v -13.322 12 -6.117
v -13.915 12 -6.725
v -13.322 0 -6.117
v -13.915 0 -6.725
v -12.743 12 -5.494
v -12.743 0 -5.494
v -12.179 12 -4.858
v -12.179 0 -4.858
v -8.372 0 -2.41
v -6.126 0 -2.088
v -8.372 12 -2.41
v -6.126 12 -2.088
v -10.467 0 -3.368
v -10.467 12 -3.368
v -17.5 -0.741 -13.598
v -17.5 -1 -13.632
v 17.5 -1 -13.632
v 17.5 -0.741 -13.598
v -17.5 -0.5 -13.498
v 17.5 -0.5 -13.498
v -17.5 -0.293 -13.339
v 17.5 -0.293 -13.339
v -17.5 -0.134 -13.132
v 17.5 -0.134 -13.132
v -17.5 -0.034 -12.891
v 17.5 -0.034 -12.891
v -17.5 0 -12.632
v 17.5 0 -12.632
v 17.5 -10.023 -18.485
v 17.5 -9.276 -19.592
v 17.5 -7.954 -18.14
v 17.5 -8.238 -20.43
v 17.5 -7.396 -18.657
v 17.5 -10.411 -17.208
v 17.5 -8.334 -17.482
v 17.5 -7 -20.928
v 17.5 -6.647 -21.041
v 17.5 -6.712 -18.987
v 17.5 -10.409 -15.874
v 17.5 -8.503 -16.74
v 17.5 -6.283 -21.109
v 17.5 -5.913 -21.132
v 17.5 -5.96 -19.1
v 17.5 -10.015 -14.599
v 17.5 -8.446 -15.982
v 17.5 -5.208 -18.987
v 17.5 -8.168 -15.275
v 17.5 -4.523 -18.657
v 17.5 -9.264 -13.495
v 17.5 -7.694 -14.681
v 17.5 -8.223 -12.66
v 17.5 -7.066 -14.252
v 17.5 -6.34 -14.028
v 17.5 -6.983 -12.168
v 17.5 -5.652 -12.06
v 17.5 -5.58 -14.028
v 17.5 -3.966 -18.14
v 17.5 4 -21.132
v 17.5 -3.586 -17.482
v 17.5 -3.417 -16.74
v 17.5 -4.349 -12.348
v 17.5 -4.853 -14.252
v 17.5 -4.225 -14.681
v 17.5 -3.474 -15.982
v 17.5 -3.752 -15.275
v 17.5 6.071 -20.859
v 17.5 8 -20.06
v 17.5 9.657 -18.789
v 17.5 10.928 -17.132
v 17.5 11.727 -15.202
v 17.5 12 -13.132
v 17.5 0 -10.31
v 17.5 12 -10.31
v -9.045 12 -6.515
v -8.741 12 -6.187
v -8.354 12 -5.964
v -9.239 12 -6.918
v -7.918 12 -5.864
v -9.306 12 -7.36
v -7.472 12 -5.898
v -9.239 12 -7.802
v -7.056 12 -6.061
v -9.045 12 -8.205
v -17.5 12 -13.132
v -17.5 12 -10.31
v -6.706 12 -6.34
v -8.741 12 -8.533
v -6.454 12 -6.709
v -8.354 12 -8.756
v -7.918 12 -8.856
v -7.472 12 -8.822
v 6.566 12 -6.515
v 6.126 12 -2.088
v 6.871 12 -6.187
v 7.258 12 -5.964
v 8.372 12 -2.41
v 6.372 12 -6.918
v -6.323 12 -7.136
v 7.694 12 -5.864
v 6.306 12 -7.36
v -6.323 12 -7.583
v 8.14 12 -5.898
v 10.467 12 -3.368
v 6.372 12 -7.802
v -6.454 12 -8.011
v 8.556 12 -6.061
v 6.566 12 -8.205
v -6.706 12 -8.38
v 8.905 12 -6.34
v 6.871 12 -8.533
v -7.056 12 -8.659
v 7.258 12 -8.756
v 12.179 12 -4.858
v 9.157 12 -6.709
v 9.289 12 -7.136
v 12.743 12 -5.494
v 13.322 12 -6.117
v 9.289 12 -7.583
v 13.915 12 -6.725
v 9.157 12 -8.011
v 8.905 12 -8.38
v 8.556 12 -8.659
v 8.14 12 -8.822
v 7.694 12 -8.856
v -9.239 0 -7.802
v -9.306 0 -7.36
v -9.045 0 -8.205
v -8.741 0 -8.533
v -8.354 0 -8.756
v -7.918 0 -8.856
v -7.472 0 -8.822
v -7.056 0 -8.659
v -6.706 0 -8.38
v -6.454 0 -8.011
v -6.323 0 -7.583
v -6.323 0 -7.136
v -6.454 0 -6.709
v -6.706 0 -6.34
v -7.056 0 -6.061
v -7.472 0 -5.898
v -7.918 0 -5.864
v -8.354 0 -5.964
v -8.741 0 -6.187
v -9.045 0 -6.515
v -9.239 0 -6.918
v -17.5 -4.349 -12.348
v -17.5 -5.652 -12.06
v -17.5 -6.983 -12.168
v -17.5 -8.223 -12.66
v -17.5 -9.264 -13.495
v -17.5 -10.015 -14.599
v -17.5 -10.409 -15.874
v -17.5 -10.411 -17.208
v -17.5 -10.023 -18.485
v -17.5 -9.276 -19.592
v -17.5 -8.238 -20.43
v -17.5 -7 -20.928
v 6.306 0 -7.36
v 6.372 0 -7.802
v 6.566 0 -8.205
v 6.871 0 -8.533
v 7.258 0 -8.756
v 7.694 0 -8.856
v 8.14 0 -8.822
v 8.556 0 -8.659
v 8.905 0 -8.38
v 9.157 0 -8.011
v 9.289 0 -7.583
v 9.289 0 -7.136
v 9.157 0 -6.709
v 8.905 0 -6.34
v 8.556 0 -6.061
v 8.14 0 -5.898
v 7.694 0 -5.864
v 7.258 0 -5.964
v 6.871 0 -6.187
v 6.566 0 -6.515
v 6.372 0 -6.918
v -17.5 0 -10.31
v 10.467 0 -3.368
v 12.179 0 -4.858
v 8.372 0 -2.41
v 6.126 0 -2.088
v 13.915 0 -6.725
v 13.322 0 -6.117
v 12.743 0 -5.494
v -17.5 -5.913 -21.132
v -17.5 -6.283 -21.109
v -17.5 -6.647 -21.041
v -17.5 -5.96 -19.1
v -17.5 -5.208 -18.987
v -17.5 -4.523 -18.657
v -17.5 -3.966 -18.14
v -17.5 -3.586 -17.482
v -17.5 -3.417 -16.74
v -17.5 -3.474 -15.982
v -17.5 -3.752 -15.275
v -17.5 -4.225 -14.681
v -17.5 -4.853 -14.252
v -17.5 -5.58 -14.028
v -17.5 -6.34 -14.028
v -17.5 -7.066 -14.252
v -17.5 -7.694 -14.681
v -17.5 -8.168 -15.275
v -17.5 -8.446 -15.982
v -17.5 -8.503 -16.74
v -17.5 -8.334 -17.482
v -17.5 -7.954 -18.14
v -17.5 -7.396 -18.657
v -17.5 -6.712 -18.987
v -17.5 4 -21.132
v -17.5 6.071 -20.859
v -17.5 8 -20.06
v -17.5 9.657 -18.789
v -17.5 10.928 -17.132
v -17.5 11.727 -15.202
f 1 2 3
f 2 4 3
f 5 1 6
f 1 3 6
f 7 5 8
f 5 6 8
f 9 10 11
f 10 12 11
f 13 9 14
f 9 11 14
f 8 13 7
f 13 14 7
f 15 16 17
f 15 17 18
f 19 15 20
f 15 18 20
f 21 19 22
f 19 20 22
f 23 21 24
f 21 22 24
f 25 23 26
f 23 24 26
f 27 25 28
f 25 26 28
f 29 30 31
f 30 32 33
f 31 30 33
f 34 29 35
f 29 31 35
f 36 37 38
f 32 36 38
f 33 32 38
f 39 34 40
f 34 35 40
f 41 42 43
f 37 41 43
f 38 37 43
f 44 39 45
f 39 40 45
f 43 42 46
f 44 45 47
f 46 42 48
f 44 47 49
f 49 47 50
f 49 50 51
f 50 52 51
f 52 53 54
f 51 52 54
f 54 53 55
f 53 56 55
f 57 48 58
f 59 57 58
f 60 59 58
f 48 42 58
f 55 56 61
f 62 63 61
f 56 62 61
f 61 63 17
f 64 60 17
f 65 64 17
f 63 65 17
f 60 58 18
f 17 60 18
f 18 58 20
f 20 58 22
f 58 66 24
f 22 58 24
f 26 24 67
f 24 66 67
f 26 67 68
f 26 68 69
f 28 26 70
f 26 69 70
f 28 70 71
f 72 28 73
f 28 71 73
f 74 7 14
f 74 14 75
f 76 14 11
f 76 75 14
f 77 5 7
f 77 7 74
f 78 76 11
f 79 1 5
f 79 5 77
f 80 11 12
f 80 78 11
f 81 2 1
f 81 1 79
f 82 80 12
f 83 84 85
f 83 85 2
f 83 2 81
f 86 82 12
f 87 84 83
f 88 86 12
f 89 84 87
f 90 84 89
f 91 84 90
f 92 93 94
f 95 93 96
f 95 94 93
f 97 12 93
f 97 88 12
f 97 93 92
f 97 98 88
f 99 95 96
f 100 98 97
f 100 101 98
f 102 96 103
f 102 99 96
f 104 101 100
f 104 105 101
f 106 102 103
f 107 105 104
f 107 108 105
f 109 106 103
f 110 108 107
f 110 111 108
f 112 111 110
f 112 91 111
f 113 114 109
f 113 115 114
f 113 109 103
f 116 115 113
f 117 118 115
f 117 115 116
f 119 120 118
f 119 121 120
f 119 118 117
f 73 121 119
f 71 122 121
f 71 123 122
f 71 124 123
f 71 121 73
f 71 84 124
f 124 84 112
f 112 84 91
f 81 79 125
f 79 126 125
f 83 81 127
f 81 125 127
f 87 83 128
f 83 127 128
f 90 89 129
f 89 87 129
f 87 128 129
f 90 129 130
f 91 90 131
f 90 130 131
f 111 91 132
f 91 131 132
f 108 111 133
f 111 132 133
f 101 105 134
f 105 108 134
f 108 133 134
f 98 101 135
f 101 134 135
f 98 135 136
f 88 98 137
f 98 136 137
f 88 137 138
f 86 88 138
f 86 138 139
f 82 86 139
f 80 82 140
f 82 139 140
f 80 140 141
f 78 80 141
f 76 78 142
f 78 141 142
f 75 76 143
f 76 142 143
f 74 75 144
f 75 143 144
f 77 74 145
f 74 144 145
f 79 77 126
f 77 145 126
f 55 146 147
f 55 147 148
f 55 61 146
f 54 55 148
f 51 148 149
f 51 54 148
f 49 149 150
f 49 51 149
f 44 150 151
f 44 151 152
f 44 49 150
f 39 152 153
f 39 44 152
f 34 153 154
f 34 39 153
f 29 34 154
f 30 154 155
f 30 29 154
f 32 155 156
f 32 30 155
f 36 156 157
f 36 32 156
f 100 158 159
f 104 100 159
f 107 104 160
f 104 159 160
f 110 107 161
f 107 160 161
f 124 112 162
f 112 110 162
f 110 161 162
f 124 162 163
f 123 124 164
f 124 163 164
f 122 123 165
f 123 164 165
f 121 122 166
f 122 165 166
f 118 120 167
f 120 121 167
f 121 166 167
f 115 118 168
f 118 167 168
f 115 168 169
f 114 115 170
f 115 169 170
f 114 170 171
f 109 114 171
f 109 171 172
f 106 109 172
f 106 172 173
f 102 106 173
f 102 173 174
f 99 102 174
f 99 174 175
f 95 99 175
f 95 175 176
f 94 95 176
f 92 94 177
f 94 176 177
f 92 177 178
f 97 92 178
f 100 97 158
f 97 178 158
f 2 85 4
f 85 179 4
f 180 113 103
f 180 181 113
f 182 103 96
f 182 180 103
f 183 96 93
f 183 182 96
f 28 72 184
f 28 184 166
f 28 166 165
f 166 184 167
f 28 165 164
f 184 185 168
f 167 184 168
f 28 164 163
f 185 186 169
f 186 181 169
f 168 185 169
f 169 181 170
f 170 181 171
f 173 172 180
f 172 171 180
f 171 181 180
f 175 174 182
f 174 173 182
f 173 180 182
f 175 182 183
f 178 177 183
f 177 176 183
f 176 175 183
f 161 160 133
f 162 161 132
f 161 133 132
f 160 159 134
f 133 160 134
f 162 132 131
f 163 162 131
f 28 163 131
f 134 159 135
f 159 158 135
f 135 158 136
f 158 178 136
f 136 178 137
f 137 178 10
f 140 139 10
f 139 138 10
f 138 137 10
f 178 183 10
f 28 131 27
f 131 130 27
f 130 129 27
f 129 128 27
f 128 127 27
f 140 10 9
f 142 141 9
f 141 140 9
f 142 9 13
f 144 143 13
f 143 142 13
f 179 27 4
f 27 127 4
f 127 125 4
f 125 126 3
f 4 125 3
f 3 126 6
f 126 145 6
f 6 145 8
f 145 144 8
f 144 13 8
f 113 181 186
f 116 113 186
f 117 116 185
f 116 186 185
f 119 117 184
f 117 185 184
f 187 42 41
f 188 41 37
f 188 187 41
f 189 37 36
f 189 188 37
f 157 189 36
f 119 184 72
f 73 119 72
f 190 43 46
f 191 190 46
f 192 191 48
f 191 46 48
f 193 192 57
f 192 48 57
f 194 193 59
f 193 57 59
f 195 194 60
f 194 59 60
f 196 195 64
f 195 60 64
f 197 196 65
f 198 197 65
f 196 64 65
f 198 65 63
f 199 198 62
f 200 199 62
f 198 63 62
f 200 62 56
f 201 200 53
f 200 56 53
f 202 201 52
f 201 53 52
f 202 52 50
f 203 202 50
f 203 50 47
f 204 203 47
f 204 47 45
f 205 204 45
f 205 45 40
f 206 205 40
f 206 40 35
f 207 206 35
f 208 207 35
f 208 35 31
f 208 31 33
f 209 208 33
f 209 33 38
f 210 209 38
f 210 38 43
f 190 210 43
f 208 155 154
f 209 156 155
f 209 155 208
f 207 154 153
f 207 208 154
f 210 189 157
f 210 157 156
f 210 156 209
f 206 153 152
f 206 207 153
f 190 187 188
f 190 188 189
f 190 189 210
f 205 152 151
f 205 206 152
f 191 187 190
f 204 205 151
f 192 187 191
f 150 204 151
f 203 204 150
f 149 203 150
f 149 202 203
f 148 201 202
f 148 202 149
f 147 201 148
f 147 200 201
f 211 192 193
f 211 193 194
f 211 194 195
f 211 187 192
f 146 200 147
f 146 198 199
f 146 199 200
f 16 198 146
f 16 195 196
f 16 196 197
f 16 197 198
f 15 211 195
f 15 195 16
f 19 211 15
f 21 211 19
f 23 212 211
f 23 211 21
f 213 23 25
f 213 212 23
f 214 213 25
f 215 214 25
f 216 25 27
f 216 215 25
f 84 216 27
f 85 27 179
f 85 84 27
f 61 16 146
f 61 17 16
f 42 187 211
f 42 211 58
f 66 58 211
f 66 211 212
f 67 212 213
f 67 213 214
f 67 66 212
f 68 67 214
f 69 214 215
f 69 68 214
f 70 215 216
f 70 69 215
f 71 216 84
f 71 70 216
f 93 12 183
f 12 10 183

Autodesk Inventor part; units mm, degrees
ref_plane "YZ Plane" through (0, 0, 0) normal (1, 0, 0) x (0, 1, 0)
ref_plane "XZ Plane" through (0, 0, 0) normal (0, 1, 0) x (-1, 0, 0)
ref_plane "XY Plane" through (0, 0, 0) normal (0, 0, 1) x (1, 0, 0)
sketch "Sketch1" plane through (0, 0, 0) normal (0, 1, 0) x (-1, 0, 0)
  circle A0 centre (-30, -5.1319) radius 1.5
  arc A1 (-31.1155, 2.2846) -> (-30, -12.6319) centre (-30, -5.1319) ccw
  arc A2 (-30, -12.6319) -> (-31.1155, 2.2846) centre (-30, -5.1319) ccw construction
  circle A3 centre (-16.9706, -0.5878) radius 1.5
  circle A4 centre (16.9706, -0.5878) radius 1.5
  circle A5 centre (16.9706, -0.5878) radius 5 construction
  line L0 (-16.9706, 4.4122) -> (-31.1155, 2.2846)
  circle A6 centre (-16.9706, -0.5878) radius 5 construction
  circle A7 centre (-7.8058, -8.4213) radius 1.55
  line L1 (0, -8.4213) -> (-15.6117, -8.4213) construction
  circle A8 centre (0, 0) radius 1.55
  line L2 (-16.9706, 4.4122) -> (16.9706, 4.4122)
  line L3 (30, -12.6319) -> (-30, -12.6319)
  circle A9 centre (30, -5.1319) radius 1.5
  line L4 (0, 4.2106) -> (0, -4.2106) construction
  line L5 (0, -4.2106) -> (0, -12.6319) construction
  line L6 (0, -4.2106) -> (3.1574, -4.2106) construction
  line L7 (0, -8.4213) -> (15.6117, -8.4213) construction
  line L8 (16.9706, 4.4122) -> (31.1155, 2.2846)
  arc A10 (31.1155, 2.2846) -> (30, -12.6319) centre (30, -5.1319) ccw construction
  arc A11 (30, -12.6319) -> (31.1155, 2.2846) centre (30, -5.1319) ccw
  circle A12 centre (7.8058, -8.4213) radius 1.55
  point P0 (0, 0)
  point P1 (0, 0)
  dimension "d0" = 10
  dimension "d1" = 10
  dimension "d2" = 15
  dimension "d3" = 15
  dimension "d4" = 3.1
  dimension "d5" = 3.1
  dimension "d6" = 3.1
sketch "Sketch2" plane through (0, 0, 0) normal (0, 1, 0) x (-1, 0, 0)
  circle A0 centre (15, 9.8681) radius 3
  circle A1 centre (16.9706, -0.5878) radius 1.5
  arc A2 (3.1574, 6.6664) -> (-3.1574, 6.6664) centre (0, 4.2106) ccw
  line L0 (3.1574, 6.6664) -> (11.0366, -3.464)
  arc A3 (11.0366, -3.464) -> (13.9152, -6.7248) centre (38.6639, 18.024) ccw
  line L1 (13.9152, -6.7248) -> (21.1612, -13.9708)
  arc A4 (30.0072, 37.5736) -> (30.286, 34.6489) centre (32.7505, 36.3595) ccw
  arc A5 (35.8309, 43.8114) -> (30.0072, 37.5736) centre (41.895, 32.3124) ccw
  circle A6 centre (25.4558, 41.8386) radius 1.5
  circle A7 centre (30, 54.8681) radius 1.5
  circle A8 centre (16.9706, 50.3239) radius 1.5
  circle A9 centre (15, 39.8681) radius 3
  circle A10 centre (24.2029, 72.4055) radius 1.5
  line L2 (27.7949, 74.3102) -> (17.0958, 107.9924)
  arc A11 (17.0958, 107.9924) -> (14.6505, 110.5406) centre (13.2835, 106.7814) ccw
  circle A12 centre (13.2835, 106.7814) radius 1.5
  line L3 (14.6505, 110.5406) -> (2.0505, 115.1224)
  circle A13 centre (-24.2029, 72.4055) radius 1.5
  arc A14 (2.0505, 115.1224) -> (-2.0505, 115.1224) centre (0, 109.4837) ccw
  line L4 (-17.0958, 107.9924) -> (-27.7949, 74.3102)
  circle A15 centre (-13.2835, 106.7814) radius 1.5
  arc A16 (-14.6505, 110.5406) -> (-17.0958, 107.9924) centre (-13.2835, 106.7814) ccw
  line L5 (-2.0505, 115.1224) -> (-14.6505, 110.5406)
  line L6 (-25.5, 17.3681) -> (-25.5, 32.3681)
  line L7 (-28.5, 32.3681) -> (-28.5, 17.3681)
  line L8 (-31, 32.3681) -> (-31, 17.3681)
  arc A17 (-28.5, 17.3681) -> (-25.5, 17.3681) centre (-27, 17.3681) ccw
  arc A18 (-31, 17.3681) -> (-30.286, 15.0873) centre (-27, 17.3681) ccw
  arc A19 (-30.0072, 37.5736) -> (-35.8309, 43.8114) centre (-41.895, 32.3124) ccw
  arc A20 (-25.5, 32.3681) -> (-28.5, 32.3681) centre (-27, 32.3681) ccw
  arc A21 (-30.286, 34.6489) -> (-31, 32.3681) centre (-27, 32.3681) ccw
  arc A22 (-30.286, 34.6489) -> (-30.0072, 37.5736) centre (-32.7505, 36.3595) ccw
  circle A23 centre (-25.4558, 41.8386) radius 1.5
  circle A24 centre (-15, 39.8681) radius 3
  circle A25 centre (-16.9706, 50.3239) radius 1.5
  arc A26 (-30.0072, 12.1625) -> (-30.286, 15.0873) centre (-32.7505, 13.3766) ccw
  arc A27 (-35.8309, 5.9248) -> (-30.0072, 12.1625) centre (-41.895, 17.4238) ccw
  arc A28 (-35.8309, 5.9248) -> (-21.1612, -13.9708) centre (-30, -5.1319) ccw
  line L9 (-21.1612, -13.9708) -> (-13.9152, -6.7248)
  circle A29 centre (-15, 9.8681) radius 3
  circle A30 centre (-25.4558, 7.8975) radius 1.5
  circle A31 centre (-16.9706, -0.5878) radius 1.5
  circle A32 centre (-30, -5.1319) radius 1.5
  line L10 (-11.0366, -3.464) -> (-3.1574, 6.6664)
  arc A33 (-13.9152, -6.7248) -> (-11.0366, -3.464) centre (-38.6639, 18.024) ccw
  line L11 (31, 17.3681) -> (31, 32.3681)
  arc A34 (28.5, 32.3681) -> (25.5, 32.3681) centre (27, 32.3681) ccw
  line L12 (25.5, 32.3681) -> (25.5, 17.3681)
  line L13 (28.5, 17.3681) -> (28.5, 32.3681)
  arc A35 (31, 32.3681) -> (30.286, 34.6489) centre (27, 32.3681) ccw
  arc A36 (-34.9925, 66.3278) -> (-27.7949, 74.3102) centre (-40.1848, 78.2458) ccw
  arc A37 (-34.9925, 66.3278) -> (-35.8309, 43.8114) centre (-30, 54.8681) ccw
  circle A38 centre (-30, 54.8681) radius 1.5
  arc A39 (30.0072, 12.1625) -> (35.8309, 5.9248) centre (41.895, 17.4238) ccw
  circle A40 centre (30, -5.1319) radius 1.5
  arc A41 (21.1612, -13.9708) -> (35.8309, 5.9248) centre (30, -5.1319) ccw
  circle A42 centre (25.4558, 7.8975) radius 1.5
  arc A43 (25.5, 17.3681) -> (28.5, 17.3681) centre (27, 17.3681) ccw
  arc A44 (30.286, 15.0873) -> (30.0072, 12.1625) centre (32.7505, 13.3766) ccw
  arc A45 (30.286, 15.0873) -> (31, 17.3681) centre (27, 17.3681) ccw
  arc A46 (35.8309, 43.8114) -> (34.9925, 66.3278) centre (30, 54.8681) ccw
  arc A47 (27.7949, 74.3102) -> (34.9925, 66.3278) centre (40.1848, 78.2458) ccw
  circle A48 centre (-30, -5.1319) radius 1.5 construction
  point P0 (0, 0)
  point P1 (0, 109.4837)
sketch "Sketch3" plane through (0, 0, 0) normal (0, 1, 0) x (-1, 0, 0)
  arc A0 (3.1574, 6.6664) -> (-3.1574, 6.6664) centre (0, 4.2106) ccw projected
  line L0 (-11.0366, -3.464) -> (-3.1574, 6.6664) projected
  line L1 (3.1574, 6.6664) -> (11.0366, -3.464) projected
  arc A1 (11.0366, -3.464) -> (13.9152, -6.7248) centre (38.6639, 18.024) ccw projected
  arc A2 (-13.9152, -6.7248) -> (-11.0366, -3.464) centre (-38.6639, 18.024) ccw projected
  line L2 (-21.1612, -13.9708) -> (-13.9152, -6.7248) projected
  line L3 (13.9152, -6.7248) -> (21.1612, -13.9708) projected
  line L4 (30, -12.6319) -> (-30, -12.6319) projected
  circle A3 centre (-7.8058, -8.4213) radius 1.55 construction
  circle A4 centre (7.8058, -8.4213) radius 1.55 construction
  circle A5 centre (0, 0) radius 1.55 projected
  circle A6 centre (-16.9706, -0.5878) radius 1.5 construction
  circle A7 centre (16.9706, -0.5878) radius 1.5 construction
  line L5 (-16.9706, -2.0878) -> (16.9706, -2.0878) construction
  line L6 (7.8058, -12.6319) -> (7.8058, -2.0878) construction
  line L7 (-7.8058, -12.6319) -> (-7.8058, -2.0878) construction
  circle A8 centre (-7.8058, -7.3599) radius 1.5
  circle A9 centre (7.8058, -7.3599) radius 1.5
  line L8 (-5.032, -12.6319) -> (-5.032, -2.0878) construction
  line L9 (-5.032, -7.3599) -> (-10.6888, -7.3599) construction
  point P0 (0, 0)
  point P1 (-19.8223, -12.6319)
  point P2 (19.8223, -12.6319)
  dimension "d38" = 3
  dimension "d39" = 3
  dimension "d42" = 10.5442
extrude "Extrusion1" add sketch "Sketch3" along normal blind 6 contours L1 A1 L3 L4 L2 A2 L0 A0 | A8 | A9
sketch "Sketch4" plane through (19.8223, 0, -12.6319) normal (0, 0, -1) x (-1, 0, 0)
  line L0 (0, 0) -> (39.6447, 0) projected
  line L1 (39.6447, 0) -> (39.6447, 6) projected
  line L2 (0, 6) -> (39.6447, 6) projected
  line L3 (0, 0) -> (0, 6) projected
  point P0 (19.8223, 0)
extrude "Extrusion2" add sketch "Sketch4" along normal blind 8.5
sketch "Sketch5" plane through (0, 0, 0) normal (0, -1, 0) x (1, 0, 0)
  line L0 (-19.8223, -21.1319) -> (19.8223, -21.1319) projected
  line L1 (19.8223, -21.1319) -> (19.8223, -13.6319)
  line L2 (19.8223, -12.6319) -> (19.8223, -21.1319) projected
  line L3 (19.8223, -13.6319) -> (-19.8223, -13.6319)
  line L4 (-19.8223, -12.6319) -> (-19.8223, -21.1319) projected
  line L5 (-19.8223, -13.6319) -> (-19.8223, -21.1319)
  line L6 (-19.8223, -21.1319) -> (19.8223, -21.1319)
  point P0 (0, 0)
  dimension "d11" = 7.5
extrude "Extrusion3" add sketch "Sketch5" along normal blind 7
sketch "Sketch6" plane through (19.8223, 6, -12.6319) normal (1, 0, 0) x (0, 0, -1)
  line L0 (0, -6) -> (0, 0) construction
  line L1 (0, -6) -> (0, -11.9599) construction
  line L2 (0, -11.9599) -> (3.918, -11.9599) construction
  circle A0 centre (3.918, -11.9599) radius 2.55
  circle A1 centre (3.918, -11.9599) radius 4.5
  line L3 (1, -6) -> (1, -13) construction
  line L4 (1, -6) -> (1, -7) construction
  line L5 (1, -7) -> (-0.2839, -10.3492)
  line L6 (1, -7) -> (1, -8.5343)
  line L7 (1, -6) -> (1, -13) projected
  point P0 (-12.6319, -6)
  dimension "d15" = 5.96
  dimension "d16" = 3.918
  dimension "d17" = 5.1
  dimension "d18" = 9
  dimension "d20" = 1
fillet "Fillet2" radius 1 1 edges at (0, 0, -13.6319)
extrude "Extrusion4" add sketch "Sketch6" against normal up to surface (39.6447 mm away) contours A1
extrude "Extrusion5" cut sketch "Sketch6" against normal up to surface (39.6447 mm away) contours A0
fillet "Fillet3" radius 3 1 edges at (0, -7, -21.1319)
extrude "Extrusion6" add sketch "Sketch6" against normal up to surface (39.6447 mm away) contours A1 L5 L6
sketch "Sketch7" plane through (0, 6, 0) normal (0, 1, 0) x (1, 0, 0)
  line L0 (-19.8223, 12.6319) -> (-13.9152, 6.7248) projected
  arc A0 (-11.0366, 3.464) -> (-13.9152, 6.7248) centre (-38.6639, -18.024) ccw projected
  line L1 (-11.0366, 3.464) -> (-3.1574, -6.6664) projected
  arc A1 (-3.1574, -6.6664) -> (3.1574, -6.6664) centre (0, -4.2106) ccw projected
  line L2 (3.1574, -6.6664) -> (11.0366, 3.464) projected
  arc A2 (13.9152, 6.7248) -> (11.0366, 3.464) centre (38.6639, -18.024) ccw projected
  line L3 (13.9152, 6.7248) -> (19.8223, 12.6319) projected
  line L4 (19.8223, 12.6319) -> (19.8223, 21.1319) projected
  line L5 (-19.8223, 21.1319) -> (19.8223, 21.1319) projected
  line L6 (-19.8223, 12.6319) -> (-19.8223, 21.1319) projected
  circle A3 centre (0, 0) radius 1.55 projected
  point P0 (0, 0)
extrude "Extrusion7" add sketch "Sketch7" along normal blind 6
fillet "Fillet4" radius 8 1 edges at (0, 12, -21.1319)
sketch "Sketch8" plane through (0, 12, 0) normal (0, 1, 0) x (1, 0, 0)
  line L0 (0, 0) -> (0, 27.291) construction
  line L1 (-0.7613, 27.291) -> (-17.5, 27.291) construction
  line L2 (0.7613, 27.291) -> (17.5, 27.291) construction
  line L3 (-17.5, 27.291) -> (-17.5, 7.1815)
  line L4 (17.5, 27.291) -> (17.5, 7.1815)
  line L5 (17.5, 7.1815) -> (23.8846, 7.1815)
  line L6 (23.8846, 7.1815) -> (23.8846, 23.5209)
  line L7 (-17.5, 7.1815) -> (-22.9652, 7.1815)
  line L8 (-22.9652, 7.1815) -> (-22.9652, 23.5209)
  line L9 (-22.9652, 23.5209) -> (23.8846, 23.5209)
  point P0 (17.5, 23.5209)
  point P1 (-17.5, 23.5209)
  dimension "d34" = 35
extrude "Extrusion8" cut sketch "Sketch8" against normal through all
sketch "Sketch9" plane through (0, 0, 0) normal (0, -1, 0) x (1, 0, 0)
  circle A0 centre (0, 0) radius 1.55 projected
  circle A1 centre (-16.9706, -0.5878) radius 1.5 projected
  circle A2 centre (16.9706, -0.5878) radius 1.5 projected
  line L0 (-16.9706, -2.0878) -> (16.9706, -2.0878)
  line L1 (16.9706, -2.0878) -> (16.9706, 15.9474)
  line L2 (16.9706, 15.9474) -> (-16.9706, 15.341)
  line L3 (-16.9706, 15.341) -> (-16.9706, -2.0878)
  point P0 (0, 0)
  point P1 (-16.9706, 0.9122)
  point P2 (16.9706, 0.9122)
extrude "Extrusion9" cut sketch "Sketch9" against normal up to surface (12 mm away) contours A1 L3 L2 L1 A2 L0
fillet "Fillet5" radius 8 2 edges at (-9.9662, 6, -2.0878) (9.9662, 6, -2.0878)
extrude "Extrusion10" cut sketch "Sketch3" along normal up to surface (12 mm away) contours A8 | A9
properties part number "prig to kauri conversion front link"
